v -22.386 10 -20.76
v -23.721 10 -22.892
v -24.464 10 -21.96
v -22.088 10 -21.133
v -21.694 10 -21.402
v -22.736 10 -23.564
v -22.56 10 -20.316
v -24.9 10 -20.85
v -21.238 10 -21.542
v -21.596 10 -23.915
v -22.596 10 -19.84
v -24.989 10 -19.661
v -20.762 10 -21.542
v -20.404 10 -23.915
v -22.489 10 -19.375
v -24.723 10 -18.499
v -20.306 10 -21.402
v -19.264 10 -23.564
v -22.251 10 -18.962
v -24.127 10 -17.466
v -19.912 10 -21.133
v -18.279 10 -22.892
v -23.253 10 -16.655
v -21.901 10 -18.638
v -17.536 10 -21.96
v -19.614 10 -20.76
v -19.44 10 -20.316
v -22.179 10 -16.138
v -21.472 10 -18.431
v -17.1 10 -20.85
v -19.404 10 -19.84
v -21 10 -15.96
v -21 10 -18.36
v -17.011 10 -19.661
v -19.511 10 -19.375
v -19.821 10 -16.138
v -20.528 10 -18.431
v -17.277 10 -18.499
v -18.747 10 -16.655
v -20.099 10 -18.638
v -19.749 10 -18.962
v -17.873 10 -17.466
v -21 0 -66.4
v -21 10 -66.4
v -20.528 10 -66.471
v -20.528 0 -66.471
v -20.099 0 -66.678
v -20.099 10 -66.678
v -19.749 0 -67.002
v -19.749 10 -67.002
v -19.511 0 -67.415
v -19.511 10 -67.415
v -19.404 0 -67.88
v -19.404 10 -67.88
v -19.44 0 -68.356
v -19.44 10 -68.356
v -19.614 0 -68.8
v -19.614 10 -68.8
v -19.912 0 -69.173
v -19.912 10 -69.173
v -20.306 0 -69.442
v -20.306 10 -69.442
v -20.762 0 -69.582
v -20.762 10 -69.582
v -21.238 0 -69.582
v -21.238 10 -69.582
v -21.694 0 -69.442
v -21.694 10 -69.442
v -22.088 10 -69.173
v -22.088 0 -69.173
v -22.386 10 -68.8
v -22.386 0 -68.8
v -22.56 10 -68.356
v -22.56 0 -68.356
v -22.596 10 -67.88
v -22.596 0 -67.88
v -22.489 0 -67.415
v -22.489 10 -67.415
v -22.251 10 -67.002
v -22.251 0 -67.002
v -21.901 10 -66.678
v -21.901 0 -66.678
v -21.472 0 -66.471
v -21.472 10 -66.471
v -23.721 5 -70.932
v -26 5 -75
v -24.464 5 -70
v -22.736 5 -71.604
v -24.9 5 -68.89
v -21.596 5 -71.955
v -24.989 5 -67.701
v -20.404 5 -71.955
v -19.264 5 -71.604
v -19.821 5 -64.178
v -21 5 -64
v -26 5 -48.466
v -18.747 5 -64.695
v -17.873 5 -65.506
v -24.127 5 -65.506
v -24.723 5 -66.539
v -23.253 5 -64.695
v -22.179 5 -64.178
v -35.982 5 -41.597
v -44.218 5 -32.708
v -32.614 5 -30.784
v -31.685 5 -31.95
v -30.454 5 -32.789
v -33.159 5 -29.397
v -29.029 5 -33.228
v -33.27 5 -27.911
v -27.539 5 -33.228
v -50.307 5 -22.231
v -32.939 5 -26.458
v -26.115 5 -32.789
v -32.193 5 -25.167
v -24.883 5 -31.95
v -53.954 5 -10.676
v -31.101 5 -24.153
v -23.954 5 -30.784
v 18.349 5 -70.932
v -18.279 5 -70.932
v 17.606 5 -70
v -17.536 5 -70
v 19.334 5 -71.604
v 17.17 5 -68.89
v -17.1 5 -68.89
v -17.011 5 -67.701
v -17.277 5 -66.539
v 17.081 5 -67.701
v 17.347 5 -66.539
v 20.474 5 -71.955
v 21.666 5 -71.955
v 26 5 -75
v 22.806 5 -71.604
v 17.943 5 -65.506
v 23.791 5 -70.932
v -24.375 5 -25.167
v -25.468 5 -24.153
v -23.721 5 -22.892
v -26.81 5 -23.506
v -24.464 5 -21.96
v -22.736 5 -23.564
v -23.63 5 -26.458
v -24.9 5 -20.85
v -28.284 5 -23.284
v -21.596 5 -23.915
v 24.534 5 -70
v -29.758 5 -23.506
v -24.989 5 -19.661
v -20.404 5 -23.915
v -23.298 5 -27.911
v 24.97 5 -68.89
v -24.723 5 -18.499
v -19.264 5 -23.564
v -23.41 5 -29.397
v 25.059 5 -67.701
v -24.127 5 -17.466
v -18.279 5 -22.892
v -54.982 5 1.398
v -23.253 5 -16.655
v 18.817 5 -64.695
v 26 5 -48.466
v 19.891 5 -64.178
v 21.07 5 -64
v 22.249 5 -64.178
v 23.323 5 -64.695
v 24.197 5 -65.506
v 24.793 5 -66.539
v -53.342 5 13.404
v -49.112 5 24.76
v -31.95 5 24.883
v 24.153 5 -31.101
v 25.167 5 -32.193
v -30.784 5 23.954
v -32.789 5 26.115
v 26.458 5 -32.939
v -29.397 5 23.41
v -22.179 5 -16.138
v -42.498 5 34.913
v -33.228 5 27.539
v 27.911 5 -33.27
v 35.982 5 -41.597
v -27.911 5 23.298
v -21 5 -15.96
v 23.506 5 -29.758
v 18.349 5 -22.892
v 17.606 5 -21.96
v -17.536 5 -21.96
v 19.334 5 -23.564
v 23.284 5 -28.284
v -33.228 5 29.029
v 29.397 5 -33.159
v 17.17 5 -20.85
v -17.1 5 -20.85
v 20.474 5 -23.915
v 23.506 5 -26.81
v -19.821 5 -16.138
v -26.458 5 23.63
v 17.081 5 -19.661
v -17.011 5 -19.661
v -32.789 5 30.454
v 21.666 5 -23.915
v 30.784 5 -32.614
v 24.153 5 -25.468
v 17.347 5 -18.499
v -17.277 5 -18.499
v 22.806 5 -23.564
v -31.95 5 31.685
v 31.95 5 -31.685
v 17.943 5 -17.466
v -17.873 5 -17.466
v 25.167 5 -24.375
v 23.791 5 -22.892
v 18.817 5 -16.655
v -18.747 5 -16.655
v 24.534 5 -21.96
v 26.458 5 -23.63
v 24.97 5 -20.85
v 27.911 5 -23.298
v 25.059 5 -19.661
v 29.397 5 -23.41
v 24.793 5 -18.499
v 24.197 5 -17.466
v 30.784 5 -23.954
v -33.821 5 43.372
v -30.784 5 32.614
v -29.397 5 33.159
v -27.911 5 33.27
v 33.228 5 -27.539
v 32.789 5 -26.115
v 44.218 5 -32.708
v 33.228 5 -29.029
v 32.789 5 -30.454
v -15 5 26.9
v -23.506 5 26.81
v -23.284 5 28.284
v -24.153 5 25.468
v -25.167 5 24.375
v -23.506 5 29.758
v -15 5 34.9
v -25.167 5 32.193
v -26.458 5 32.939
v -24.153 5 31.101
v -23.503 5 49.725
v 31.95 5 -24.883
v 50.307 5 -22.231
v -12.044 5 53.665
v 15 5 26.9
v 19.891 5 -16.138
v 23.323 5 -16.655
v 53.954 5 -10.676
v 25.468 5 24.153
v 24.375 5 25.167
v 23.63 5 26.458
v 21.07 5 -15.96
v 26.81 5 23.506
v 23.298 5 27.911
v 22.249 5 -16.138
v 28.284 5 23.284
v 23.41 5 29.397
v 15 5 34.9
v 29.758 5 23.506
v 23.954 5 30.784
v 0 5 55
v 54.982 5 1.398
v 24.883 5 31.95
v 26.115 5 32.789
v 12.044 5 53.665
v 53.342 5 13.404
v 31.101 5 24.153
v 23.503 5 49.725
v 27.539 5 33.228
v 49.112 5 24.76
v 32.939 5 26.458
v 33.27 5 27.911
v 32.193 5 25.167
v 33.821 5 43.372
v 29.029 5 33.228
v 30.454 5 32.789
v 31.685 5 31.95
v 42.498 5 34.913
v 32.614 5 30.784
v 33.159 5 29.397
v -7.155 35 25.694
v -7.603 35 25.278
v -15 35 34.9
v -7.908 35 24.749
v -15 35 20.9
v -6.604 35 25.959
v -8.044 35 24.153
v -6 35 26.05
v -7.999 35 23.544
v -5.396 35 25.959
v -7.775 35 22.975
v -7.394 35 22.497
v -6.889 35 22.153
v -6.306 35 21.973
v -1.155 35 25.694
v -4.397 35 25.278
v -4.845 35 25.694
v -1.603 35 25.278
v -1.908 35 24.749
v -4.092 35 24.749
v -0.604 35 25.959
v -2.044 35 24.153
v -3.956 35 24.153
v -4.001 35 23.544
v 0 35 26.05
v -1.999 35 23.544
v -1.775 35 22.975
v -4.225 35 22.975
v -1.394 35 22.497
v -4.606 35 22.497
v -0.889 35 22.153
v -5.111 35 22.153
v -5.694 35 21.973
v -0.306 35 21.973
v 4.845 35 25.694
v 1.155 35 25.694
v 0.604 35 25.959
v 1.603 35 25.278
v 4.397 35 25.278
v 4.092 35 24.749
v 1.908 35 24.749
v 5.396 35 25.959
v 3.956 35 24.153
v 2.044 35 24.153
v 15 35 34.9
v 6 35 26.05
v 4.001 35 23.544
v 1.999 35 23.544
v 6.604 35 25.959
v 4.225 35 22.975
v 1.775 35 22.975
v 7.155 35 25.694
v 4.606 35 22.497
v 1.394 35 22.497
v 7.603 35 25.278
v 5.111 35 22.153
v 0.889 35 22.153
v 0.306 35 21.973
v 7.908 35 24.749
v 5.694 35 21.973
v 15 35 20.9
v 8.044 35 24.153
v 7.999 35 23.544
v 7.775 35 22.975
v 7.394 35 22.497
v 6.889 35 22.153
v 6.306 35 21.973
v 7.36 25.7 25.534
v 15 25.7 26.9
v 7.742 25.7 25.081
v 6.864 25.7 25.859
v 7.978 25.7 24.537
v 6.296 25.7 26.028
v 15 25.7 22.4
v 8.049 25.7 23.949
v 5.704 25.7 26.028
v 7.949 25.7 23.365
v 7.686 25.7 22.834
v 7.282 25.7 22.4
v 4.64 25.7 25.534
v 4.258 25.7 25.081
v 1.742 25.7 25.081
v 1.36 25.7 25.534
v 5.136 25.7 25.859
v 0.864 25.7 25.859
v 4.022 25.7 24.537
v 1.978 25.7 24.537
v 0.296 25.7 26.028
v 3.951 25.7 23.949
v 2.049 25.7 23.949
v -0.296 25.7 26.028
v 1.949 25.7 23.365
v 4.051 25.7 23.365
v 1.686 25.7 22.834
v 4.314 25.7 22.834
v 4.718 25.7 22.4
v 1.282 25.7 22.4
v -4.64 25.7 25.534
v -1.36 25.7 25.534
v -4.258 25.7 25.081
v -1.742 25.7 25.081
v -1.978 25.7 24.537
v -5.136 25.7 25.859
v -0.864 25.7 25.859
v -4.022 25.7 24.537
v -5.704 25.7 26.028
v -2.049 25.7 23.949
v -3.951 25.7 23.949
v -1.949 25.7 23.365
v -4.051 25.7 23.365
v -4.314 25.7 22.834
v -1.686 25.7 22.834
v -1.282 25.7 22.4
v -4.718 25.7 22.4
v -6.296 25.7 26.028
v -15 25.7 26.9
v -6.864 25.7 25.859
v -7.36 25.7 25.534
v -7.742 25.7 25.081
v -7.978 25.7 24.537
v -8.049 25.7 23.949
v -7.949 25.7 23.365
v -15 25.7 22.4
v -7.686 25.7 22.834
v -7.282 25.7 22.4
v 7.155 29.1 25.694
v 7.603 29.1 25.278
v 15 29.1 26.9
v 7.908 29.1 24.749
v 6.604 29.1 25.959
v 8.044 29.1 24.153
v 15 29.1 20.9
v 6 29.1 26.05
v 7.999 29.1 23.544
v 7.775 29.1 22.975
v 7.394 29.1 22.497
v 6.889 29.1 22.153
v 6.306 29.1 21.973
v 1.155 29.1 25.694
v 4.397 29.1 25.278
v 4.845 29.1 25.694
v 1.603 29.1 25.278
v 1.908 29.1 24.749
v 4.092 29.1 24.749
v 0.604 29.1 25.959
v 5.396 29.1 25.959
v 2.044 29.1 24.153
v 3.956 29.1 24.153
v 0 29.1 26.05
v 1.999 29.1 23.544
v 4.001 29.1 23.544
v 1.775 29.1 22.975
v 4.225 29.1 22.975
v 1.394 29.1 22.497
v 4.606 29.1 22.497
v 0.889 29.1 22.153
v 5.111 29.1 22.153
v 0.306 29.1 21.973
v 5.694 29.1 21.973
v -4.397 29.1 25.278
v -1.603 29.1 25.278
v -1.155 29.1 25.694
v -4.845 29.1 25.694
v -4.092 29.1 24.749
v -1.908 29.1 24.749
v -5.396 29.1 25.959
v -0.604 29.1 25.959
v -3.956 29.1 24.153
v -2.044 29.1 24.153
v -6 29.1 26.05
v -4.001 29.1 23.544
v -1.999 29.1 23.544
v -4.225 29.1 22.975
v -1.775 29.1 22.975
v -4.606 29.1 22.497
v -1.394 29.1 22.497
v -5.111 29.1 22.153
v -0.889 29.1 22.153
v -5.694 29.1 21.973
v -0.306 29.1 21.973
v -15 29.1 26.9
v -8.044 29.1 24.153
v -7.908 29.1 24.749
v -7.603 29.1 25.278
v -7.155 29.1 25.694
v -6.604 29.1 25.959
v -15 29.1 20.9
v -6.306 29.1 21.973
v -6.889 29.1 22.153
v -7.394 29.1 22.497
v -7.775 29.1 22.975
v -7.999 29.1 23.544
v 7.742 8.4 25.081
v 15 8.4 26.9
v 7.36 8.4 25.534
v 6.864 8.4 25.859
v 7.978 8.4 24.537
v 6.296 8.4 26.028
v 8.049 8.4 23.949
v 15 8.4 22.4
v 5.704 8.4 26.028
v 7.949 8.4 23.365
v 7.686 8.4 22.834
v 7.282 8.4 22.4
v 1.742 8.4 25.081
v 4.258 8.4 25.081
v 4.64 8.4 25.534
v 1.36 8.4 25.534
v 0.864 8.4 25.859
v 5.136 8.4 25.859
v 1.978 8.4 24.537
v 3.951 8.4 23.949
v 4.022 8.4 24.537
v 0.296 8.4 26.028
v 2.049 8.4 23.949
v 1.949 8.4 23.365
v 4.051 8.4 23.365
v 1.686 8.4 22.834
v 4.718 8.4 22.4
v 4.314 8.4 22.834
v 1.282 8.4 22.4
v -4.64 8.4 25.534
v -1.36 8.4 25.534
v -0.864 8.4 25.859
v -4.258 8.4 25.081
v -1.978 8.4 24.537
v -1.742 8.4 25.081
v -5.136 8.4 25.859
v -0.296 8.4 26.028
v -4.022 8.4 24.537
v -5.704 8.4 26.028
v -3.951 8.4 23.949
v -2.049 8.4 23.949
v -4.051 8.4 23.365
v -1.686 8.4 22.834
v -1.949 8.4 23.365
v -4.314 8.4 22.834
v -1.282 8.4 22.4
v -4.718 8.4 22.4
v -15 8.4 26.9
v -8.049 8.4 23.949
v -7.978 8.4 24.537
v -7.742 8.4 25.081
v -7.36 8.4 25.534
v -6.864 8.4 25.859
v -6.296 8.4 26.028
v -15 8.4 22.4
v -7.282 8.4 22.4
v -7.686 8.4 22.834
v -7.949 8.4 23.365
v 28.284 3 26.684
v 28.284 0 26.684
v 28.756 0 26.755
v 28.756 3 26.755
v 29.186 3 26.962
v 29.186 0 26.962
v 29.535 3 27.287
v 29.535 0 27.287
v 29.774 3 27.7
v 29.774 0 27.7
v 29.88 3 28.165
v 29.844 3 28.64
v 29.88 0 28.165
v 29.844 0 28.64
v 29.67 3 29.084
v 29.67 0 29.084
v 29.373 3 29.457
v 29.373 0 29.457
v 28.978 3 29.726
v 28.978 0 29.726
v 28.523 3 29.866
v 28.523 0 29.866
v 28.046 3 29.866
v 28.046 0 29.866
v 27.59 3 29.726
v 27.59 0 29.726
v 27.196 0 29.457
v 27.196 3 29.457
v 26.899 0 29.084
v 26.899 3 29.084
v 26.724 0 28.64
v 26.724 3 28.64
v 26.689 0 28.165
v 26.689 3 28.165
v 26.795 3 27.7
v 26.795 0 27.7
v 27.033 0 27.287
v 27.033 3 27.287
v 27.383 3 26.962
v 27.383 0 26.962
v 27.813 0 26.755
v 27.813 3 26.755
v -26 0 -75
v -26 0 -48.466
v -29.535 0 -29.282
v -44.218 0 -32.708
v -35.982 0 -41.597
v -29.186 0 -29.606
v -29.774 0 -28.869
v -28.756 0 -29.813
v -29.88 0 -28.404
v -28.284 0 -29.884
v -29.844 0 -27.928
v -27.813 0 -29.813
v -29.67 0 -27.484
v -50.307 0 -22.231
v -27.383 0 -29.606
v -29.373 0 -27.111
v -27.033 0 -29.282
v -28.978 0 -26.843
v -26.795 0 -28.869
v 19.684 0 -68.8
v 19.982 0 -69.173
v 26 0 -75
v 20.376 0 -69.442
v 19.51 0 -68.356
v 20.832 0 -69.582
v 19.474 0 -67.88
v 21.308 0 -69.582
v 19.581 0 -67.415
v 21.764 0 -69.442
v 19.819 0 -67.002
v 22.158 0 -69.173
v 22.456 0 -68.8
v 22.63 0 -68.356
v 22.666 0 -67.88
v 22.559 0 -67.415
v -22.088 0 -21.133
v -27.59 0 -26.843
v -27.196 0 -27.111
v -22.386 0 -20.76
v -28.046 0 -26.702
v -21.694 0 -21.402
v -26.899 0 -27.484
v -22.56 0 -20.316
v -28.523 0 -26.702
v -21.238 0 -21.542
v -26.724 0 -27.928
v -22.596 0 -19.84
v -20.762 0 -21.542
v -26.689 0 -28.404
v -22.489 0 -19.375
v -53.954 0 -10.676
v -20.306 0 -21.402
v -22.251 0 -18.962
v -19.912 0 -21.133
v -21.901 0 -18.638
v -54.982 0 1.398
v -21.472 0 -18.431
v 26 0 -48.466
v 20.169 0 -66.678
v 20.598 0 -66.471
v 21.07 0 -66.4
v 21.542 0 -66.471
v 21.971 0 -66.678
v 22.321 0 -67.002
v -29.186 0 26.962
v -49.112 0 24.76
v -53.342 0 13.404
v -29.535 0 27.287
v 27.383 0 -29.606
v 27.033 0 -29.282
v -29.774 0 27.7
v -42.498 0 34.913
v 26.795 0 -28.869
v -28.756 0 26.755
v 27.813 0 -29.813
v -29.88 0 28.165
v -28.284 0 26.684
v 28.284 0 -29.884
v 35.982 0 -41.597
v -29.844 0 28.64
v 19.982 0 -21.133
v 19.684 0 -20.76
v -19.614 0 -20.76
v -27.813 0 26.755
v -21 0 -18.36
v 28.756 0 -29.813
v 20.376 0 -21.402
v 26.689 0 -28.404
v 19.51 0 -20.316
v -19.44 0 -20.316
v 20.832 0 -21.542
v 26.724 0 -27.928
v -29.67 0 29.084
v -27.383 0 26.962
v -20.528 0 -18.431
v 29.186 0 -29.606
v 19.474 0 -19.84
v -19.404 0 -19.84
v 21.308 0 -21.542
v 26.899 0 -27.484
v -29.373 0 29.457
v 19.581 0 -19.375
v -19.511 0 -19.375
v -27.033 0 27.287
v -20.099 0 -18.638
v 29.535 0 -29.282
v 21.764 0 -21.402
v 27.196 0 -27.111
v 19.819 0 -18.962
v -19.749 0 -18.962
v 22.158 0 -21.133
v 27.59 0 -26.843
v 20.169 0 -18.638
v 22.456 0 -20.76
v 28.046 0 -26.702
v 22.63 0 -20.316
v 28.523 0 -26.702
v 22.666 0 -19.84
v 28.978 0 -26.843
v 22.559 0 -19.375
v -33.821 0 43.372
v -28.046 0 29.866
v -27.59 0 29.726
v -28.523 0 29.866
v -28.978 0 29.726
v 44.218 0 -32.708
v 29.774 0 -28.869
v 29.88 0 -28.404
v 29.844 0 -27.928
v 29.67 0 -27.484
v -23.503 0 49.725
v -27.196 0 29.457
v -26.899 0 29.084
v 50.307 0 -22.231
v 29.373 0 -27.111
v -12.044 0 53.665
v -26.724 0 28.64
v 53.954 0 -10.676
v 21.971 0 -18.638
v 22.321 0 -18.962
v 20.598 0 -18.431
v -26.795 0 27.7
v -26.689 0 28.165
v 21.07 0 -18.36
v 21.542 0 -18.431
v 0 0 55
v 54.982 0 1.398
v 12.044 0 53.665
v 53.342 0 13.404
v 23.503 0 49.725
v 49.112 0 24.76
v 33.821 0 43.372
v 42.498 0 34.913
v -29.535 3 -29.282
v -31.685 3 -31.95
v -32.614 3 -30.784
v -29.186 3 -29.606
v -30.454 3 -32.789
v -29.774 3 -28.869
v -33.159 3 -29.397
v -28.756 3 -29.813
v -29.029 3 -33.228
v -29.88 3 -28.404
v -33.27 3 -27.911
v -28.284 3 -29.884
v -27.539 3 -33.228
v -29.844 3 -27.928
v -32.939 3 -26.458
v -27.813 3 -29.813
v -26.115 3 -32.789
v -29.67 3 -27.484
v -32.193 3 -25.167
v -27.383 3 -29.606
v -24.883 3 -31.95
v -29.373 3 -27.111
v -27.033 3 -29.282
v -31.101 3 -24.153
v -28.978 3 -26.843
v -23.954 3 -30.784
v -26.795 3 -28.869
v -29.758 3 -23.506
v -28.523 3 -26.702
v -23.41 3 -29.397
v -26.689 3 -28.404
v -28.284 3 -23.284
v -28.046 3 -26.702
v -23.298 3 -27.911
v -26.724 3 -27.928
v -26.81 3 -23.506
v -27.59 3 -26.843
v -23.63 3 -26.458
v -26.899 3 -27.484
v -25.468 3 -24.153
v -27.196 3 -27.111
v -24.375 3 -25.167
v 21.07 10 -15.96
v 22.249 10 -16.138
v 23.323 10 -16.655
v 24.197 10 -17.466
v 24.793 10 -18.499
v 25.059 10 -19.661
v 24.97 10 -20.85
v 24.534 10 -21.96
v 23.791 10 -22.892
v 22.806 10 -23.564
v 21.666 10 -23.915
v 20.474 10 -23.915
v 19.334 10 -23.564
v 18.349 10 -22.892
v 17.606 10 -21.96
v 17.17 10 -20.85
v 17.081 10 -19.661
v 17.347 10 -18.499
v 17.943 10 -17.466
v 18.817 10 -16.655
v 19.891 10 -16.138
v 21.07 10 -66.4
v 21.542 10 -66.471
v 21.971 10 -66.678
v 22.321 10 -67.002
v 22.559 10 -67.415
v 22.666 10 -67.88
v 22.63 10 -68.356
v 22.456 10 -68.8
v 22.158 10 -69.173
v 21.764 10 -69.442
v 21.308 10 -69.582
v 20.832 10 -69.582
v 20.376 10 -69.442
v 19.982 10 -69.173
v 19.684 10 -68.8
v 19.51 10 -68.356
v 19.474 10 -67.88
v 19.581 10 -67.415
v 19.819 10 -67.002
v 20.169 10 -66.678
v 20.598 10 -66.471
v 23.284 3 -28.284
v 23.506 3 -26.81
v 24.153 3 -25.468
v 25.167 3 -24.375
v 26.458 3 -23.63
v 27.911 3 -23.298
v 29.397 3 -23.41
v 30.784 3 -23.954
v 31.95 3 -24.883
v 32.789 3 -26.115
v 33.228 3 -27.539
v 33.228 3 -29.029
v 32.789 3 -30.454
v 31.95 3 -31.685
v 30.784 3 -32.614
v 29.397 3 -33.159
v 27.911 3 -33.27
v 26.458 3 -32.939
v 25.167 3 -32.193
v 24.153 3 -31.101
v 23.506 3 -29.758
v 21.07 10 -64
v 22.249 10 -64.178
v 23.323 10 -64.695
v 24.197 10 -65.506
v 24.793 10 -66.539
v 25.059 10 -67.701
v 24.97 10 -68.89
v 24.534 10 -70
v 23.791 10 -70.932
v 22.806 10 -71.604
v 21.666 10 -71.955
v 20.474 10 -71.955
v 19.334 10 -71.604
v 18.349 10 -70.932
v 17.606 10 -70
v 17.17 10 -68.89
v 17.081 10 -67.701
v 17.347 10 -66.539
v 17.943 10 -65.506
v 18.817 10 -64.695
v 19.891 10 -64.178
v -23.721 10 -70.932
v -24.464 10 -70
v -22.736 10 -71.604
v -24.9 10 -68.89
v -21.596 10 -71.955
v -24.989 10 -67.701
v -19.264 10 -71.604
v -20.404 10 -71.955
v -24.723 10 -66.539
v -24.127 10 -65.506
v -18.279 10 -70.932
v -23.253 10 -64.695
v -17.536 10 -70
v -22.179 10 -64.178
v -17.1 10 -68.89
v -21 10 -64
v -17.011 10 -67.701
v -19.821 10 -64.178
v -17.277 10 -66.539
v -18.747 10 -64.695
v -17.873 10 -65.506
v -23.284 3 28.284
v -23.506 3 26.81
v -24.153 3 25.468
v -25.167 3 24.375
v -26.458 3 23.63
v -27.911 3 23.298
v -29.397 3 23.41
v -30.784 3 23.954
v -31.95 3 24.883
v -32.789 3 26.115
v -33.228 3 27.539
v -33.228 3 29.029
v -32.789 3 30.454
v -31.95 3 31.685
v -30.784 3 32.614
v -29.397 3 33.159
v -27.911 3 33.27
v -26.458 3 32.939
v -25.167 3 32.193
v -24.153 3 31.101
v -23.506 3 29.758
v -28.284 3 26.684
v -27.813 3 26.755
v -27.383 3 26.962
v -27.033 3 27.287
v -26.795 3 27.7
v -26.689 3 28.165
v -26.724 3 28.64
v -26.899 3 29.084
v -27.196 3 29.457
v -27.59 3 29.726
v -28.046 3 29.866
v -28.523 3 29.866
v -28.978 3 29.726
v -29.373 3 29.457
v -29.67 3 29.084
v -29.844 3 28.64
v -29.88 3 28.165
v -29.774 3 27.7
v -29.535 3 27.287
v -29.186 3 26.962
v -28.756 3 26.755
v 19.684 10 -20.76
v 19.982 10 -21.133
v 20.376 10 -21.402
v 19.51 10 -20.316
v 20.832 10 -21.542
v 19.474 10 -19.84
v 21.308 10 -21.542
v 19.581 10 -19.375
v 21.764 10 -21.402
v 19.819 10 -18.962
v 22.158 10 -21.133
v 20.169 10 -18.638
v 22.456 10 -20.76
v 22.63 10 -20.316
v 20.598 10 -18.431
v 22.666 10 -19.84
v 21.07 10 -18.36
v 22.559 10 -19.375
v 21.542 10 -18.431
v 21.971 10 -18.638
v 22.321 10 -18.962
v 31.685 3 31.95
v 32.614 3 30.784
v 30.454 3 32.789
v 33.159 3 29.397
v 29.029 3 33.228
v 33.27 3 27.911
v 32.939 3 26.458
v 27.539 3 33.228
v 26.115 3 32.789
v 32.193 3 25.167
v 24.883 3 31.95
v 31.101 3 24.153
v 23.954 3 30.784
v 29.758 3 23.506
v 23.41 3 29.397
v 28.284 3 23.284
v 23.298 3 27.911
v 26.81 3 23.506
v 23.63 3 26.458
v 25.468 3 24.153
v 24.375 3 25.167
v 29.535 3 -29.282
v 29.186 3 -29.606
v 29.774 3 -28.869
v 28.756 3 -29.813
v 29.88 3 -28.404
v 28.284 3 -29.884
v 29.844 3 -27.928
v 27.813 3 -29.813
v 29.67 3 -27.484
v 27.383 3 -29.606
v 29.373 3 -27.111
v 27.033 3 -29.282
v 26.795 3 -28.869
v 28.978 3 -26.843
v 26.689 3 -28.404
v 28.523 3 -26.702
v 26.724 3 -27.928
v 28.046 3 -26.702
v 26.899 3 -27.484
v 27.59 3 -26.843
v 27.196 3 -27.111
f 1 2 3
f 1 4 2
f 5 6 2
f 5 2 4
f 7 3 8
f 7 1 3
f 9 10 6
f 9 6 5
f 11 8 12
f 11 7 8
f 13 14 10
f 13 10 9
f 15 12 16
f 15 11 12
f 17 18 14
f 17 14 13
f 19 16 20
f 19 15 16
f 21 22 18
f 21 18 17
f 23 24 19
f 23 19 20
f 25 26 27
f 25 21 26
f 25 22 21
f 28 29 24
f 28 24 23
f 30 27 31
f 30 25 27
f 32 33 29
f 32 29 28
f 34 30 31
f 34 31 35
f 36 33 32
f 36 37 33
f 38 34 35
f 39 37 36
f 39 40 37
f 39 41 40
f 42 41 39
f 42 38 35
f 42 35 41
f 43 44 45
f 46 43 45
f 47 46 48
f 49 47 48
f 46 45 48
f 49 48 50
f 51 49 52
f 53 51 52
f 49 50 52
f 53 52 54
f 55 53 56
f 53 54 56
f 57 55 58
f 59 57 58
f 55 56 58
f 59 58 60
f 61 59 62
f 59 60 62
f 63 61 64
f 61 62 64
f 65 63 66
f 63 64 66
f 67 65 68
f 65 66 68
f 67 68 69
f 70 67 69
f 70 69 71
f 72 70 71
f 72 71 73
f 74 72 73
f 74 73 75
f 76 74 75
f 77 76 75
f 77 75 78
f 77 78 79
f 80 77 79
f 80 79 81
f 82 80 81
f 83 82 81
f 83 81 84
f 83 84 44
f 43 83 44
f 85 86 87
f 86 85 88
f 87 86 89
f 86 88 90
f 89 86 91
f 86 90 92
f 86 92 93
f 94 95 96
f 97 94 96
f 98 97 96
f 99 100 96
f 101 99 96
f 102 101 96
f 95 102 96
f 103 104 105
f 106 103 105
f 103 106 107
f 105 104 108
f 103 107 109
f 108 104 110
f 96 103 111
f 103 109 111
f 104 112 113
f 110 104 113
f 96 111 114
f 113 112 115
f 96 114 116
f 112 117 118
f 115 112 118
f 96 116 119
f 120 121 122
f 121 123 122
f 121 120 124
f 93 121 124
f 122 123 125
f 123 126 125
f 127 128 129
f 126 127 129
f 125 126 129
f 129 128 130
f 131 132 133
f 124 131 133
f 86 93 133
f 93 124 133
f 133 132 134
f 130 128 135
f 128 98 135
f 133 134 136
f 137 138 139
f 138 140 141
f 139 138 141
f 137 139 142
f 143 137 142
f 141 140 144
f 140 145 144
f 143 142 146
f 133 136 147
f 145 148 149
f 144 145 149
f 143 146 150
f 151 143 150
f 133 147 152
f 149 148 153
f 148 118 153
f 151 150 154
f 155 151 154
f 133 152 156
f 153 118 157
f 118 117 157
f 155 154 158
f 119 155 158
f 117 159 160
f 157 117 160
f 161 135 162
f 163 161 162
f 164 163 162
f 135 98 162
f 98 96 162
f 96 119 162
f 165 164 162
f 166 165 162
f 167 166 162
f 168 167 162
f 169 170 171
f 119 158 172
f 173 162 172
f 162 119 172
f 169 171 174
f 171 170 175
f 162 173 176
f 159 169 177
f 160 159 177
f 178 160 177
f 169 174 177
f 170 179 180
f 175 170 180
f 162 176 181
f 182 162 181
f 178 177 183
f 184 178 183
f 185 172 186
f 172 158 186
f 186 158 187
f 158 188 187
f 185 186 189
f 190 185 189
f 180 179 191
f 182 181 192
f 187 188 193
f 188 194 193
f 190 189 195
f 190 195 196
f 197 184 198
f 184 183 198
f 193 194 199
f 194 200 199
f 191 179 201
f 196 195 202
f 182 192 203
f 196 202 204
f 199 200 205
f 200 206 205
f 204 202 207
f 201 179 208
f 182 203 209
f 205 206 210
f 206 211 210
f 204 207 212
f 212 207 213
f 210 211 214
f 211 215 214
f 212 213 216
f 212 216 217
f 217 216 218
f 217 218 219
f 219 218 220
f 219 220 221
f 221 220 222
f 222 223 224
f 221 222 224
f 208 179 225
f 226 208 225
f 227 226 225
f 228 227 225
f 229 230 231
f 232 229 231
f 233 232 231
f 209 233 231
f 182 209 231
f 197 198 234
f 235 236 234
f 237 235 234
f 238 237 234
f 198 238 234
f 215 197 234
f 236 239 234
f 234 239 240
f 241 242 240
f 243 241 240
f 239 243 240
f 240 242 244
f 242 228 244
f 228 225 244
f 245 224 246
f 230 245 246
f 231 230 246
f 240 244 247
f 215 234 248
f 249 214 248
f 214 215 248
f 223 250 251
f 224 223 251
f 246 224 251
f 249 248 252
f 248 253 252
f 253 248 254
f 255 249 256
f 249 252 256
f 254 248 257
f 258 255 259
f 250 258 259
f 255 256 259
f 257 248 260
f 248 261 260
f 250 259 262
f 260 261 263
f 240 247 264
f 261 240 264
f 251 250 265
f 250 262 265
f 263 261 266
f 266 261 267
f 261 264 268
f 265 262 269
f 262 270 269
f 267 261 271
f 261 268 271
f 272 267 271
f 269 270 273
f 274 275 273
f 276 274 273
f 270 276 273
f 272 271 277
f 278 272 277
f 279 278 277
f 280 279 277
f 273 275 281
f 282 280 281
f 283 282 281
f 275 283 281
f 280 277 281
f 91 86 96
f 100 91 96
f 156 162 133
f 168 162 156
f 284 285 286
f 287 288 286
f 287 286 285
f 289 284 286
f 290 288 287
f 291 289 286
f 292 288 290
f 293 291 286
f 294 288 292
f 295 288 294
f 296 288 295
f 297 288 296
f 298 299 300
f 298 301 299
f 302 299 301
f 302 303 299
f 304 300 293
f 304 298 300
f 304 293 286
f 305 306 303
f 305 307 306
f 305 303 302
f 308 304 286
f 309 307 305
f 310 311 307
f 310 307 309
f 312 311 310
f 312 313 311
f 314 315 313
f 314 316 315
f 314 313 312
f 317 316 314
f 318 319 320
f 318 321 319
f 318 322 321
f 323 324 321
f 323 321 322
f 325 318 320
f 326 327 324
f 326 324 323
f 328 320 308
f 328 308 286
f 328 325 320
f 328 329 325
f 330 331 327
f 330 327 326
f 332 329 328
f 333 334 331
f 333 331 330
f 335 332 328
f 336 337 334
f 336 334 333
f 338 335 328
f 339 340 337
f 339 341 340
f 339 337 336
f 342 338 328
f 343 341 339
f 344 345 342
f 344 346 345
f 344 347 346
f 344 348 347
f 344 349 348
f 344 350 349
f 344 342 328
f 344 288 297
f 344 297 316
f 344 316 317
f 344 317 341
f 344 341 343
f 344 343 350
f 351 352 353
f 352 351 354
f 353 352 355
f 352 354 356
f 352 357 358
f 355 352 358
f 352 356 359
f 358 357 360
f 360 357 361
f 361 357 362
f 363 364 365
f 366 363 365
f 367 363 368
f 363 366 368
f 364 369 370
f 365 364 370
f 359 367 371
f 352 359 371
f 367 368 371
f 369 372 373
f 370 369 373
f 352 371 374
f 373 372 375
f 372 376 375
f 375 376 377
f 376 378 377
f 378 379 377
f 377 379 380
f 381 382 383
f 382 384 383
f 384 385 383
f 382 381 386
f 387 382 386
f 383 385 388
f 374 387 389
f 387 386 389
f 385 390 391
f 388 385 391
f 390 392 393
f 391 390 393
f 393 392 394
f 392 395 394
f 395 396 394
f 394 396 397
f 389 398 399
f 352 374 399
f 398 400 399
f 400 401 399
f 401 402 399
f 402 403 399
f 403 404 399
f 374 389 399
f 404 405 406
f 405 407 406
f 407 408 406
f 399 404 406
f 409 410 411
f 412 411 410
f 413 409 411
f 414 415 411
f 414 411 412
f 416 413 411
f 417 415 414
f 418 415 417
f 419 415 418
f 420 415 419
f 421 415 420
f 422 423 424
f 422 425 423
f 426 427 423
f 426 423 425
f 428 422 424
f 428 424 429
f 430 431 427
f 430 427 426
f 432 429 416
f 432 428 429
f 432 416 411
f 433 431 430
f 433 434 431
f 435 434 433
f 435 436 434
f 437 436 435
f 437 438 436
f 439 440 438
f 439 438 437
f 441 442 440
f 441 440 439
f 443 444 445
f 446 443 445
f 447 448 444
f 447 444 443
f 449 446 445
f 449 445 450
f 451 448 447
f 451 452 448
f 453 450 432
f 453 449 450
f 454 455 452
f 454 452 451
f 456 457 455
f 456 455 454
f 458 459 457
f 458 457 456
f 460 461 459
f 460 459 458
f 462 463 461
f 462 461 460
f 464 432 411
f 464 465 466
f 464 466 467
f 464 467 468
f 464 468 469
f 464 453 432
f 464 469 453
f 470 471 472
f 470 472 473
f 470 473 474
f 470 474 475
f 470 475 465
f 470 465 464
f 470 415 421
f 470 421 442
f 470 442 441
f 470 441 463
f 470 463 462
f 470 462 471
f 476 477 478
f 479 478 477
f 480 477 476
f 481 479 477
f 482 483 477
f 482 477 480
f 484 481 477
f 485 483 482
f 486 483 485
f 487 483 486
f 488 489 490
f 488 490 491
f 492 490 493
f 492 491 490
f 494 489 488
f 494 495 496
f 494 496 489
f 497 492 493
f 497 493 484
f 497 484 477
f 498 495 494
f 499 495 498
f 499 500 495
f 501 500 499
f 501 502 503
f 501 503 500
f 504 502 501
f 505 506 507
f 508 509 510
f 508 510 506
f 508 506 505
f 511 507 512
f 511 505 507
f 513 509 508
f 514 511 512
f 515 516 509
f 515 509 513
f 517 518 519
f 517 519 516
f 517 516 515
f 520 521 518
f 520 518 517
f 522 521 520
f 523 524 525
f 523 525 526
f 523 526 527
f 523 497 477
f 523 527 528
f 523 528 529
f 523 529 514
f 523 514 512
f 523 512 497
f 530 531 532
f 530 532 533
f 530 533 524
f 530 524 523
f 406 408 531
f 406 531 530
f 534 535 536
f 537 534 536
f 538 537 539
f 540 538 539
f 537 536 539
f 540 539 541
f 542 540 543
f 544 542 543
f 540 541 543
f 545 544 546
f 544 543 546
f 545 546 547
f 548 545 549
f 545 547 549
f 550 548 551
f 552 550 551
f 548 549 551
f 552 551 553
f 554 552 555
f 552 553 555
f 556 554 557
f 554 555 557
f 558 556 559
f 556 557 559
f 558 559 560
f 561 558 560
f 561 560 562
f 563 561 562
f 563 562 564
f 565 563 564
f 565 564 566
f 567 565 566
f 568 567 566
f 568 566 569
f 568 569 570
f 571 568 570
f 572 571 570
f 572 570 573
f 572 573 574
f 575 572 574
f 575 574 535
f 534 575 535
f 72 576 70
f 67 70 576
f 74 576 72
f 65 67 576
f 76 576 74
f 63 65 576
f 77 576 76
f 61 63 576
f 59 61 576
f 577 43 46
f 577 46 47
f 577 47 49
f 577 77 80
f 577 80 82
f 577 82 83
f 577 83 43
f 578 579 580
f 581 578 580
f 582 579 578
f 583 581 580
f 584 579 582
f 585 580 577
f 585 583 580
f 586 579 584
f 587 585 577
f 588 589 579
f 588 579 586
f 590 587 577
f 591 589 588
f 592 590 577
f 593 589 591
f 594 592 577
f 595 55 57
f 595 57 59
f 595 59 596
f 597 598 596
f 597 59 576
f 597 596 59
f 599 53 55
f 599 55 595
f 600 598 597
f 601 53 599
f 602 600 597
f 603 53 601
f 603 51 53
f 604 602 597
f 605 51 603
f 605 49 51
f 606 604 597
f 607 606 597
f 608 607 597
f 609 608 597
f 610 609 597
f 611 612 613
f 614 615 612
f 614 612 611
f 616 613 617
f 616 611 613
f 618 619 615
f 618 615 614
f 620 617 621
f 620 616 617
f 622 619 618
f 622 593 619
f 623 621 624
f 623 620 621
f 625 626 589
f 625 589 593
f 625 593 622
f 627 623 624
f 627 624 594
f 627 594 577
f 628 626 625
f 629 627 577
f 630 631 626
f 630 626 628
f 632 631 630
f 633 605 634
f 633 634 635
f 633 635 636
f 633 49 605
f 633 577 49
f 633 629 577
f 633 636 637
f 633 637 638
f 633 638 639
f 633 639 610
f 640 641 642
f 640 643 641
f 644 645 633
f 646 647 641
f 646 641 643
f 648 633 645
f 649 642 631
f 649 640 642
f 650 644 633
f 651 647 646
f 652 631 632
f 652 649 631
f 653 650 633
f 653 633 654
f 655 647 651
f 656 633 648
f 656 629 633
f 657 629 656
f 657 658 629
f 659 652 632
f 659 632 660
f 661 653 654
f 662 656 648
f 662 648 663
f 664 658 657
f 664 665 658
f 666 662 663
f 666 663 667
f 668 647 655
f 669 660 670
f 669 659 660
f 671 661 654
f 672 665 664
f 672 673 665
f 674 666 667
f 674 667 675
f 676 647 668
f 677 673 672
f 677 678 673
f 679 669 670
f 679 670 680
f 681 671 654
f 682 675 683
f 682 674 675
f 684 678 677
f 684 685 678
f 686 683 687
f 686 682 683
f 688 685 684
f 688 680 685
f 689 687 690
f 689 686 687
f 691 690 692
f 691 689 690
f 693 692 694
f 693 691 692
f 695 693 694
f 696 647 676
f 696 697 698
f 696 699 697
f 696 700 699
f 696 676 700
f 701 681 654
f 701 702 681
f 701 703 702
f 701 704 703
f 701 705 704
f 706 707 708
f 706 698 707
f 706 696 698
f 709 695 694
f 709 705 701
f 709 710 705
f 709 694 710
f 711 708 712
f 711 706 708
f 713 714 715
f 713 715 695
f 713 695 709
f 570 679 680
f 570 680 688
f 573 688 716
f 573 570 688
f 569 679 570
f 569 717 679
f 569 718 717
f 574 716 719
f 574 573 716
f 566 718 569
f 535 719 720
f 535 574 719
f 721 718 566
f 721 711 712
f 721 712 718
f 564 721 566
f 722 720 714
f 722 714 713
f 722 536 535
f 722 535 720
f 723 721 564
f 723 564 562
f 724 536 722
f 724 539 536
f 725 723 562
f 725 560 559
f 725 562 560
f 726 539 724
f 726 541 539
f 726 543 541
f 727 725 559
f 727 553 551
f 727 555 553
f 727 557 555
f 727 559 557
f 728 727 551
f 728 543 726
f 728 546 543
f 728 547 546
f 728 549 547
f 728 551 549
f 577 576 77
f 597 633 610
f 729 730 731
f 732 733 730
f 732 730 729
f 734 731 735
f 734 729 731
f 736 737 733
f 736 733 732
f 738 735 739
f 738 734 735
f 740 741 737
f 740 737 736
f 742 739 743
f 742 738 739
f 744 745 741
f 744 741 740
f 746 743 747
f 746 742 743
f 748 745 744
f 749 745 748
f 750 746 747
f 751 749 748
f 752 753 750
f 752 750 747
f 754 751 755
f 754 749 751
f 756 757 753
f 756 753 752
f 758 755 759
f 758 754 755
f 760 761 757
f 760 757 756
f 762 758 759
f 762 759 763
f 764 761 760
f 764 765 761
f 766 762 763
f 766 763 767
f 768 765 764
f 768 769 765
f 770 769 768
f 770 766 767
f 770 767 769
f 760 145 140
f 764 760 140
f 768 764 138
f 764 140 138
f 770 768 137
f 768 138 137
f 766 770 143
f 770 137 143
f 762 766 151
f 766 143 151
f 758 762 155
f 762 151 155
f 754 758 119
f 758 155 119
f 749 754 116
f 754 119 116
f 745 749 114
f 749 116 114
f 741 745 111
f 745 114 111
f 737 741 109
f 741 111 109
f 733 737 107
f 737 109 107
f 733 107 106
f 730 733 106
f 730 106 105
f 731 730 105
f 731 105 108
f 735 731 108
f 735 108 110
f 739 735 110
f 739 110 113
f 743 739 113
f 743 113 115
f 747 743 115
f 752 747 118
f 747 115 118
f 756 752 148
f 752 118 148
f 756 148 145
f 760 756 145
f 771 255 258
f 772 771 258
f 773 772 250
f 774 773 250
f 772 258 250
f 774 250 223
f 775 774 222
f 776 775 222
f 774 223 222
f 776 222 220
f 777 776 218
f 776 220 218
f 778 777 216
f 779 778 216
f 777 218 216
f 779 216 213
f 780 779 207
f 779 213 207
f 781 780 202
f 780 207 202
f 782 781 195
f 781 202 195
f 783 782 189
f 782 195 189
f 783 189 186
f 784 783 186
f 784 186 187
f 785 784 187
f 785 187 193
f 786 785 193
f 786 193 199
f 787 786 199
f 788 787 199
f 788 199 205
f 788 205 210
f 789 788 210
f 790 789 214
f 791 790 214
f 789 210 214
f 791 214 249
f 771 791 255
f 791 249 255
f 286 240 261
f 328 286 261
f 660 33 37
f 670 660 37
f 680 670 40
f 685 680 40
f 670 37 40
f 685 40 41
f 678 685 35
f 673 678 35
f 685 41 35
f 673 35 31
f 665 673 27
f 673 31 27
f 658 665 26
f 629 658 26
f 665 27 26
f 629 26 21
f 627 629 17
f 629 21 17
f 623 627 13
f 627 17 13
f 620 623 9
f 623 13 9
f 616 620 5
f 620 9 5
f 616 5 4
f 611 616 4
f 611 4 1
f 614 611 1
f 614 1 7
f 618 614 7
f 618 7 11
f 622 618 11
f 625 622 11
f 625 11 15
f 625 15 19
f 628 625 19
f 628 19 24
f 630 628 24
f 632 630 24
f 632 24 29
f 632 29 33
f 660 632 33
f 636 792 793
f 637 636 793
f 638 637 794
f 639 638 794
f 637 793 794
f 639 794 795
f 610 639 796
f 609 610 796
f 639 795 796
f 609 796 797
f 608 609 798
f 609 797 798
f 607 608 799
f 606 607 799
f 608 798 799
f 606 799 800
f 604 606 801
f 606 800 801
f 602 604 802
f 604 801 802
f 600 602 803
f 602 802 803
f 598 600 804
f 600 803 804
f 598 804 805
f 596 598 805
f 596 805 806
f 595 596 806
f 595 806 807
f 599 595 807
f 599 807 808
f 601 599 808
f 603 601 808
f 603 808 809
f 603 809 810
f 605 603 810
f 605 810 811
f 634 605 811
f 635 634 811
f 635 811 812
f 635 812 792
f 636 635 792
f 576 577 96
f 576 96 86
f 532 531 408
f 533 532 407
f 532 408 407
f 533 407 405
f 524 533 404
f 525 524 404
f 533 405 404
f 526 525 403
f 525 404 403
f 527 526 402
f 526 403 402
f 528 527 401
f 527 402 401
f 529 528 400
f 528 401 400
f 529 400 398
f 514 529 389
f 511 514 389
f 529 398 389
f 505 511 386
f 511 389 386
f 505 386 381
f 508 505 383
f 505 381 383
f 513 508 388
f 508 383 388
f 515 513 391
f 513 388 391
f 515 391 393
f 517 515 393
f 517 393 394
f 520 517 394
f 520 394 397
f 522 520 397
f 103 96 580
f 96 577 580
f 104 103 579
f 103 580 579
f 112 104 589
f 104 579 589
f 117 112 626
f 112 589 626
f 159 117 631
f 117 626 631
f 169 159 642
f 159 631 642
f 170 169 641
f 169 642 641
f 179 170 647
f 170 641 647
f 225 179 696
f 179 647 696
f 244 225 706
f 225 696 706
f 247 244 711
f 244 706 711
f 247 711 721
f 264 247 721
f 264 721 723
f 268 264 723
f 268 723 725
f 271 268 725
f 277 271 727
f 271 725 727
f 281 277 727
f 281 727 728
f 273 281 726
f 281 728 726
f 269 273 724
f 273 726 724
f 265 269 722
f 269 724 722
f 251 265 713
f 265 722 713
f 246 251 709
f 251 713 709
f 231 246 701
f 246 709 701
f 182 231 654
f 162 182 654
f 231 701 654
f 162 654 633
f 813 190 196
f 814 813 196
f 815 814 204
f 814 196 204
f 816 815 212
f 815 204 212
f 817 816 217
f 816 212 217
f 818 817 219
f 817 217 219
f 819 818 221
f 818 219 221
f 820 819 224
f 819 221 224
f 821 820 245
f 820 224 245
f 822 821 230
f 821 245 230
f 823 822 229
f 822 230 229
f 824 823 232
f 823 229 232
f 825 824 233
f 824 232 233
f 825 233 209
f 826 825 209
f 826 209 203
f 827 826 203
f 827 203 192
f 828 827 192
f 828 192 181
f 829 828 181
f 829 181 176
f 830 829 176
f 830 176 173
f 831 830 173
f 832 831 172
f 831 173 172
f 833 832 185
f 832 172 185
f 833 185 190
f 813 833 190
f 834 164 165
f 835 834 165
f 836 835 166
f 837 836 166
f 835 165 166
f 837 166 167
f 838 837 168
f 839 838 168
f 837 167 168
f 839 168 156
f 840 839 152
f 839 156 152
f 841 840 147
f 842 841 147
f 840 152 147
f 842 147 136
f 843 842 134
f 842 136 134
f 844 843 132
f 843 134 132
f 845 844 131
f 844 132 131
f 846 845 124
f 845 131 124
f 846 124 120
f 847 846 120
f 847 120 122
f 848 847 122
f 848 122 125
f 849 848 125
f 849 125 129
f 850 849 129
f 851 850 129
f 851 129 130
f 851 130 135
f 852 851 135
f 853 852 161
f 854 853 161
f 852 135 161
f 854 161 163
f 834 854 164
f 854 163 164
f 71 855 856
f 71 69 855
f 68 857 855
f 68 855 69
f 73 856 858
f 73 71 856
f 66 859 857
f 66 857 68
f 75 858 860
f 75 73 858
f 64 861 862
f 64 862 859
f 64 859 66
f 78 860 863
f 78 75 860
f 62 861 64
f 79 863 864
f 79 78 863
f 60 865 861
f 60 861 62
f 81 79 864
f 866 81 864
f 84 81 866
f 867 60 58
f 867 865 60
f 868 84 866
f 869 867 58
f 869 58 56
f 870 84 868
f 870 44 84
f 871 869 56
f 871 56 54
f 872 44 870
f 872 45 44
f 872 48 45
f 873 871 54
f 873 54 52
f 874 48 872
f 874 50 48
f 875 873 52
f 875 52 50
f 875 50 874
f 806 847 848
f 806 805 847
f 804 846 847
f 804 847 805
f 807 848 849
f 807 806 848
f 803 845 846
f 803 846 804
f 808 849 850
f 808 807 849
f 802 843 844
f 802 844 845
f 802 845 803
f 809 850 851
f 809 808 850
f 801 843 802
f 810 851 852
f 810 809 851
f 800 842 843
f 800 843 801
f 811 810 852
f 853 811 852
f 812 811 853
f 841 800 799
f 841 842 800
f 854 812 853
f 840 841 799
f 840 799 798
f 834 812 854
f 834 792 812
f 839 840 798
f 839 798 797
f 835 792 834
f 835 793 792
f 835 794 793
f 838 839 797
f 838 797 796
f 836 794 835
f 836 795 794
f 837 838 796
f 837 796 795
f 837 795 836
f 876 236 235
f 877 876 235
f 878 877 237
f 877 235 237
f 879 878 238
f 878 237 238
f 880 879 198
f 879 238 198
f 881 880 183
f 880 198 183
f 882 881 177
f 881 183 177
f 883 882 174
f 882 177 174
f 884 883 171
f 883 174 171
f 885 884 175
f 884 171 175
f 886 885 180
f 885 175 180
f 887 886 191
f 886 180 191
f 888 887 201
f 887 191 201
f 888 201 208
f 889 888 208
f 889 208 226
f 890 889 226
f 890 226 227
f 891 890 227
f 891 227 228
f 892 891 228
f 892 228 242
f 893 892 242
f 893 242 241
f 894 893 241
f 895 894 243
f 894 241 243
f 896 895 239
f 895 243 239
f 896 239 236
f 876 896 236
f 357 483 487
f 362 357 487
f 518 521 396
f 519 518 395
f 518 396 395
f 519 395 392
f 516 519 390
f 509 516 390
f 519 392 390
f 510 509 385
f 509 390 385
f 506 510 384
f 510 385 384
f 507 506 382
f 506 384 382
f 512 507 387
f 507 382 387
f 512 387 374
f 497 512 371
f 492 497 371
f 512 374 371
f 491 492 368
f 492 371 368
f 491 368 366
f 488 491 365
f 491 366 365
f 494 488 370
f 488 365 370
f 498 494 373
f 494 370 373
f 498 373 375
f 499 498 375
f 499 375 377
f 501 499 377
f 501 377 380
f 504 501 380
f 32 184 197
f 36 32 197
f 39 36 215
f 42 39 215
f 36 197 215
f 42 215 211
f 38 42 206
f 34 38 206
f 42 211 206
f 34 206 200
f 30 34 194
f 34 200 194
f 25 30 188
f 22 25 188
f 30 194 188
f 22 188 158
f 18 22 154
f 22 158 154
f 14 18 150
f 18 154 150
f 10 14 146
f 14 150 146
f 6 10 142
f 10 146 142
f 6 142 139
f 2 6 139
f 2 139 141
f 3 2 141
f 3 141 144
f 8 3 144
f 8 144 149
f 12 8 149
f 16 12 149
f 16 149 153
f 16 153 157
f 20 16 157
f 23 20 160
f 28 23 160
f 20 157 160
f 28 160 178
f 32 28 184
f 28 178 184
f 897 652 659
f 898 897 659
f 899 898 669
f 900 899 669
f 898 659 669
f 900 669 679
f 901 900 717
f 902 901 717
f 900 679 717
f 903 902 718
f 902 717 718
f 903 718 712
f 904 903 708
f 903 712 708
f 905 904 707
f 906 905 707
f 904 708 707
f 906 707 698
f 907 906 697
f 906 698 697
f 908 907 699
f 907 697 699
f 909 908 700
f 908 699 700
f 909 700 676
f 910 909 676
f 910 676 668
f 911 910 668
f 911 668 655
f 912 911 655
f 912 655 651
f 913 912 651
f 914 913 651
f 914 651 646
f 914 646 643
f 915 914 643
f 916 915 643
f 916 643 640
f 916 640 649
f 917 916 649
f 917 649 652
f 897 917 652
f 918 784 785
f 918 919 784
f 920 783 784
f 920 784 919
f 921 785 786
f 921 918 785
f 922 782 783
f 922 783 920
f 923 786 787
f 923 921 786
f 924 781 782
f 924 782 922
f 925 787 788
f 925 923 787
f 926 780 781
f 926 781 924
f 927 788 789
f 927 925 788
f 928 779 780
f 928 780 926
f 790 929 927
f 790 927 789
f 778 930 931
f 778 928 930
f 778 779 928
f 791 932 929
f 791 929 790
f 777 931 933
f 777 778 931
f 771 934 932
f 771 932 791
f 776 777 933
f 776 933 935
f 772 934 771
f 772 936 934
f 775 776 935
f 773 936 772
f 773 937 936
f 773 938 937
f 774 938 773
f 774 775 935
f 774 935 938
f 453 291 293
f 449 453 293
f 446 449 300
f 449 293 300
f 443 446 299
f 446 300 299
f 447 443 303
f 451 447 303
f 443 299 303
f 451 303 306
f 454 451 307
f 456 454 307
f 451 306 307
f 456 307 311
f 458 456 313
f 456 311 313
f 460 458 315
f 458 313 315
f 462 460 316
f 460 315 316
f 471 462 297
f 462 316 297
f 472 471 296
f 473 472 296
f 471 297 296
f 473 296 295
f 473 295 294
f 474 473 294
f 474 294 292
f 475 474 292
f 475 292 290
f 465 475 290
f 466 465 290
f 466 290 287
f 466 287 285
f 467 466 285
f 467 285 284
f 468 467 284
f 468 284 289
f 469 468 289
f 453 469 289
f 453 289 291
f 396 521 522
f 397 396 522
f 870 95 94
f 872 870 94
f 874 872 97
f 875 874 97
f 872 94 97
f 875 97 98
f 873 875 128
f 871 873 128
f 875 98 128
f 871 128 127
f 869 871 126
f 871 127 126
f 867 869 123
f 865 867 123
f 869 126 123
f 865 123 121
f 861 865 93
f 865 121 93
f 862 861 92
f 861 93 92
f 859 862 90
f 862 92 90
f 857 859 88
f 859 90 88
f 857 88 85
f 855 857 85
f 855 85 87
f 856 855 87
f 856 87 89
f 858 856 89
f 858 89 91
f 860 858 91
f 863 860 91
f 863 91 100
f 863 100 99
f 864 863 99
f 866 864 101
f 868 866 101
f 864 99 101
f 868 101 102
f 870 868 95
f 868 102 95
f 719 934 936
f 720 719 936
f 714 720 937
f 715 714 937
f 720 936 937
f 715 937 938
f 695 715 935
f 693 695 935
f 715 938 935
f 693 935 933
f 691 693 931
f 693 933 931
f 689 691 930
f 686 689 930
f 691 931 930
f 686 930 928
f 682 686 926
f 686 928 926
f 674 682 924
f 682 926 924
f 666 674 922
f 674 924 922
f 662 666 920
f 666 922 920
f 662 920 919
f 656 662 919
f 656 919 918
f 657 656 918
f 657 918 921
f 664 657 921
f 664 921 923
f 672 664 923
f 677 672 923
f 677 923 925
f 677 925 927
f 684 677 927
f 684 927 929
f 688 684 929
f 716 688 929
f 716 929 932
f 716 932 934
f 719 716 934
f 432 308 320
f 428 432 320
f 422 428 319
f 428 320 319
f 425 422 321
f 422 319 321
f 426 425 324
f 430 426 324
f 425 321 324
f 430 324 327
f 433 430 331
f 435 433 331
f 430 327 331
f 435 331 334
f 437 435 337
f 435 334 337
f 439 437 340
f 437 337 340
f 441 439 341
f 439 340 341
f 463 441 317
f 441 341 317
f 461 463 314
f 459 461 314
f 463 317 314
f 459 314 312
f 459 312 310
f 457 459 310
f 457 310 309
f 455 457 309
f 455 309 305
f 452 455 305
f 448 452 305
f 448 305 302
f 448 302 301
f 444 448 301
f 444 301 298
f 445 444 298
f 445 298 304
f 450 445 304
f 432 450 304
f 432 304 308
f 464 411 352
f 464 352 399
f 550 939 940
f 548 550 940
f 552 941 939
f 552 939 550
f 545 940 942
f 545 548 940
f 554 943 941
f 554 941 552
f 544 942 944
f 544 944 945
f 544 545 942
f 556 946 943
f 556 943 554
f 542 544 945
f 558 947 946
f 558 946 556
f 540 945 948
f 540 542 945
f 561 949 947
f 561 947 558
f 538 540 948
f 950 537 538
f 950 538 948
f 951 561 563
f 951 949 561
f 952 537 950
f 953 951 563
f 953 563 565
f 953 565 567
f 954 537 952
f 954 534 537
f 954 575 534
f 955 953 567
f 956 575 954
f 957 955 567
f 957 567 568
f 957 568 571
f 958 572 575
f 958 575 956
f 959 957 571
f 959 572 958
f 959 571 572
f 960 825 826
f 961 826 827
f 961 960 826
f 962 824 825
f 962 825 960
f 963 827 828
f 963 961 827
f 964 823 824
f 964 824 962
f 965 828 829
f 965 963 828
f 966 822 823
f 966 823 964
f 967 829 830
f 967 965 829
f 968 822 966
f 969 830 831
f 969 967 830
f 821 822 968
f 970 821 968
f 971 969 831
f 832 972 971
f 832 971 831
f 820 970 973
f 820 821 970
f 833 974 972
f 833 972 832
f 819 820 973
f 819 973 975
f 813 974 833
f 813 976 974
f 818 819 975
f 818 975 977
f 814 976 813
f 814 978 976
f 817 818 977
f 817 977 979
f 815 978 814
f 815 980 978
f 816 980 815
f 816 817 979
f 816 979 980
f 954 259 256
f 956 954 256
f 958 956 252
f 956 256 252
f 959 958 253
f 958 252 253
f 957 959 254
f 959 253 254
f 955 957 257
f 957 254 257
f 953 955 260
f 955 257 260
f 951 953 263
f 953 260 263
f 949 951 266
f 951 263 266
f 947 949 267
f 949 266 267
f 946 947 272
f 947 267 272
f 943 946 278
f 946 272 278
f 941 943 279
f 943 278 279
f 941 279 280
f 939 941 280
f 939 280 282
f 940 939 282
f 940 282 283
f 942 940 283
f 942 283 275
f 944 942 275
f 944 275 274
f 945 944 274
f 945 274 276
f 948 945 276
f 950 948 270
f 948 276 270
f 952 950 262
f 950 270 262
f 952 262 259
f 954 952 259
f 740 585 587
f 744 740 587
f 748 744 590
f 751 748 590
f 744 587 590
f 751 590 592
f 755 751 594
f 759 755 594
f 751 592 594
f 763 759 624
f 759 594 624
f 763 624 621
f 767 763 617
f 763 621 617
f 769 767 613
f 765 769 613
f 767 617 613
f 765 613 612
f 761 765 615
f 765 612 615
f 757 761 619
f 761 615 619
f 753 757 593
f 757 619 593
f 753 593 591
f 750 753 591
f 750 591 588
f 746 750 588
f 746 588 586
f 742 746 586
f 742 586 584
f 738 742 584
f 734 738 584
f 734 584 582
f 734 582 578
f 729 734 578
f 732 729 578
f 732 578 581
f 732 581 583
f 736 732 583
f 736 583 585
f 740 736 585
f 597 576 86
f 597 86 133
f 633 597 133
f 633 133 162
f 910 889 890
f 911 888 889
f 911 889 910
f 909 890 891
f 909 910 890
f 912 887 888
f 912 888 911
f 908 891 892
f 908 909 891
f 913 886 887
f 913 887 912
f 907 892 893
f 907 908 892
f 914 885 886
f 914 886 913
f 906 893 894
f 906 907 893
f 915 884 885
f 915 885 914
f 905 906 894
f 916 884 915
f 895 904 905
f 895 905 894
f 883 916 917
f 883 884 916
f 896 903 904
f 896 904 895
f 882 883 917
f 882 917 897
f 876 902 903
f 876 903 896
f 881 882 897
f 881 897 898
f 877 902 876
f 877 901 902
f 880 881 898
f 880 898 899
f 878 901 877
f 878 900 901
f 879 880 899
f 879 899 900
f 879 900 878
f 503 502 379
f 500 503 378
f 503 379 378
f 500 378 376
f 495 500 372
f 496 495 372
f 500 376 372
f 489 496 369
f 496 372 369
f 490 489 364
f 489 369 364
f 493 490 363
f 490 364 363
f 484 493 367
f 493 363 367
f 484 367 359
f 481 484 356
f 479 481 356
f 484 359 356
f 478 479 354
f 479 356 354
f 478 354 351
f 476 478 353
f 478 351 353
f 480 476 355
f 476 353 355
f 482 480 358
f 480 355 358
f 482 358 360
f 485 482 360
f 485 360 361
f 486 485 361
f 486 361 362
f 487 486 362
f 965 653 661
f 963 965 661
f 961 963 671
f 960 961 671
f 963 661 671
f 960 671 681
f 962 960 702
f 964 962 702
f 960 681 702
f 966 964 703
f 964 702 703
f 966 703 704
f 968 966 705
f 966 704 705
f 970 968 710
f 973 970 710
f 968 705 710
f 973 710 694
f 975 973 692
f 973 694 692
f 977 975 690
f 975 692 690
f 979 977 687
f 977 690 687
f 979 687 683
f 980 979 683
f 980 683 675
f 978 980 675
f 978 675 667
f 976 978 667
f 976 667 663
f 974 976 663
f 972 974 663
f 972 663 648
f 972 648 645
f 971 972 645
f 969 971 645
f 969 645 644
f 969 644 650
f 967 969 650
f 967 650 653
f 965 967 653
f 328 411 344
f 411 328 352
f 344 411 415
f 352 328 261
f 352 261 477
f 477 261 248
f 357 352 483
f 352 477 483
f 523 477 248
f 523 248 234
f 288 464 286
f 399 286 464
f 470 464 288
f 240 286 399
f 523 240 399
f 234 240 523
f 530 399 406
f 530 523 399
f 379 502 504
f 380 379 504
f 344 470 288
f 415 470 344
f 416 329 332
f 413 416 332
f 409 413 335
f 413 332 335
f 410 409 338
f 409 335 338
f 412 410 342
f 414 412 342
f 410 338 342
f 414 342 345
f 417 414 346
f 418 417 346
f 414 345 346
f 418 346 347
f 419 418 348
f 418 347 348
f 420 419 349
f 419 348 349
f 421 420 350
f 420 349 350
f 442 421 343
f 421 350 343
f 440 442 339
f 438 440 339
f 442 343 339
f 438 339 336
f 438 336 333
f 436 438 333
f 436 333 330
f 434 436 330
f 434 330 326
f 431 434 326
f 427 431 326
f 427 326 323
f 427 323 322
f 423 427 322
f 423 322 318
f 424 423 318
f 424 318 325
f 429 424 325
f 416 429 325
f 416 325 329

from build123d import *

# Parameters (mm, degrees)
SKETCH1_R           = 55
BOSS_EXTRUDE1_DEPTH = 5
SKETCH2_W           = 30
SKETCH2_H           = 14
BOSS_EXTRUDE2_DEPTH = 30
SKETCH6_R           = 2.05
CUT_EXTRUDE3_DEPTH  = 30
SKETCH7_W           = 30
SKETCH7_H           = 3.4
CUT_EXTRUDE4_DEPTH  = 6
SKETCH10_R          = 1.6
CUT_EXTRUDE5_DEPTH  = 6
SKETCH11_W          = 30
SKETCH11_H          = 17.3
CUT_EXTRUDE6_DEPTH  = 1.5
BOSS_EXTRUDE5_DEPTH = 5
SKETCH16_R          = 4
BOSS_EXTRUDE6_DEPTH = 5
SKETCH17_R          = 1.6
CUT_EXTRUDE8_DEPTH  = 97.306801421
SKETCH13_R          = 5
CUT_EXTRUDE9_DEPTH  = 2
CIRPATTERN3_COUNT   = 4


with BuildPart() as part:
    # Sketch1 → Boss-Extrude1 (new body)
    with BuildSketch(Plane(origin=(0, 0, 0), x_dir=(1, 0, 0), z_dir=(0, 1, 0))):
        with Locations(Location((0, 0, 0), (0, 0, 270))):
            Circle(SKETCH1_R)
    extrude(amount=BOSS_EXTRUDE1_DEPTH)

    # Sketch2 → Boss-Extrude2 (add)
    with BuildSketch(Plane(origin=(0, 5, 0), x_dir=(1, 0, 0), z_dir=(0, 1, 0))):
        with Locations((0, -27.9)):
            Rectangle(SKETCH2_W, SKETCH2_H)
    extrude(amount=BOSS_EXTRUDE2_DEPTH)

    # Sketch6 → Cut-Extrude3 (cut)
    with BuildSketch(Plane(origin=(0, 35, 0), x_dir=(1, 0, 0), z_dir=(0, 1, 0))):
        with Locations(Location((-6, -24, 0), (0, 0, 270))):
            Circle(SKETCH6_R)
        with Locations(Location((0, -24, 0), (0, 0, 270))):
            Circle(SKETCH6_R)
        with Locations(Location((6, -24, 0), (0, 0, 270))):
            Circle(SKETCH6_R)
    extrude(amount=-CUT_EXTRUDE3_DEPTH, mode=Mode.SUBTRACT)

    # Sketch7 → Cut-Extrude4 (cut)
    with BuildSketch(Plane(origin=(0, 0, 20.9), x_dir=(-1, 0, 0), z_dir=(0, 0, -1))):
        with Locations((0, 6.7)):
            Rectangle(SKETCH7_W, SKETCH7_H)
        with Locations((0, 27.4)):
            Rectangle(SKETCH7_W, SKETCH7_H)
    extrude(amount=-CUT_EXTRUDE4_DEPTH, mode=Mode.SUBTRACT)

    # Sketch10 → Cut-Extrude5 (cut)
    with BuildSketch(Plane.XZ):
        with Locations(Location((-28.284271247, 28.284271247, 0), (0, 0, 270))):
            Circle(SKETCH10_R)
        with Locations(Location((28.284271247, 28.284271247, 0), (0, 0, 270))):
            Circle(SKETCH10_R)
        with Locations(Location((28.284271247, -28.284271247, 0), (0, 0, 270))):
            Circle(SKETCH10_R)
        with Locations(Location((-28.284271247, -28.284271247, 0), (0, 0, 270))):
            Circle(SKETCH10_R)
    extrude(amount=-CUT_EXTRUDE5_DEPTH, mode=Mode.SUBTRACT)

    # Sketch11 → Cut-Extrude6 (cut)
    with BuildSketch(Plane(origin=(0, 0, 20.9), x_dir=(-1, 0, 0), z_dir=(0, 0, -1))):
        with Locations((0, 17.05)):
            Rectangle(SKETCH11_W, SKETCH11_H)
    extrude(amount=-CUT_EXTRUDE6_DEPTH, mode=Mode.SUBTRACT)

    # Sketch14 → Boss-Extrude5 (add)
    with BuildSketch(Plane.XZ):
        Polygon((-26, -48.466483264), (-26, -75), (26, -75), (26, -25), (-26, -25), align=None)
    extrude(amount=-BOSS_EXTRUDE5_DEPTH)

    # Sketch16 → Boss-Extrude6 (add)
    with BuildSketch(Plane(origin=(0, 5, 0), x_dir=(1, 0, 0), z_dir=(0, 1, 0))):
        with Locations(Location((-21, 68, 0), (0, 0, 270))):
            Circle(SKETCH16_R)
        with Locations(Location((21.07, 68, 0), (0, 0, 270))):
            Circle(SKETCH16_R)
        with Locations(Location((-21, 19.96, 0), (0, 0, 270))):
            Circle(SKETCH16_R)
        with Locations(Location((21.07, 19.96, 0), (0, 0, 270))):
            Circle(SKETCH16_R)
    extrude(amount=BOSS_EXTRUDE6_DEPTH)

    # Sketch17 → Cut-Extrude8 (cut, through all)
    with BuildSketch(Plane(origin=(0, 10, 0), x_dir=(1, 0, 0), z_dir=(0, 1, 0))):
        with Locations(Location((-21, 68, 0), (0, 0, 270))):
            Circle(SKETCH17_R)
        with Locations(Location((21.07, 68, 0), (0, 0, 270))):
            Circle(SKETCH17_R)
        with Locations(Location((21.07, 19.96, 0), (0, 0, 270))):
            Circle(SKETCH17_R)
        with Locations(Location((-21, 19.96, 0), (0, 0, 270))):
            Circle(SKETCH17_R)
    extrude(amount=-CUT_EXTRUDE8_DEPTH, mode=Mode.SUBTRACT)

    # Sketch13 → Cut-Extrude9 (cut)
    with BuildSketch(Plane(origin=(0, 5, 0), x_dir=(1, 0, 0), z_dir=(0, 1, 0))):
        with Locations(Location((-28.284271247, 28.284271247, 0), (0, 0, 270))):
            Circle(SKETCH13_R)
    cut_extrude9 = extrude(amount=-CUT_EXTRUDE9_DEPTH, mode=Mode.SUBTRACT)

    # CirPattern3: Cut-Extrude9 ×4 about axis
    cirpattern3_axis = Axis((0, 0, 0), (0, 1, 0))
    for i in range(1, CIRPATTERN3_COUNT):
        add(cut_extrude9.rotate(cirpattern3_axis, i * 360 / CIRPATTERN3_COUNT), mode=Mode.SUBTRACT)


solid = part.part
